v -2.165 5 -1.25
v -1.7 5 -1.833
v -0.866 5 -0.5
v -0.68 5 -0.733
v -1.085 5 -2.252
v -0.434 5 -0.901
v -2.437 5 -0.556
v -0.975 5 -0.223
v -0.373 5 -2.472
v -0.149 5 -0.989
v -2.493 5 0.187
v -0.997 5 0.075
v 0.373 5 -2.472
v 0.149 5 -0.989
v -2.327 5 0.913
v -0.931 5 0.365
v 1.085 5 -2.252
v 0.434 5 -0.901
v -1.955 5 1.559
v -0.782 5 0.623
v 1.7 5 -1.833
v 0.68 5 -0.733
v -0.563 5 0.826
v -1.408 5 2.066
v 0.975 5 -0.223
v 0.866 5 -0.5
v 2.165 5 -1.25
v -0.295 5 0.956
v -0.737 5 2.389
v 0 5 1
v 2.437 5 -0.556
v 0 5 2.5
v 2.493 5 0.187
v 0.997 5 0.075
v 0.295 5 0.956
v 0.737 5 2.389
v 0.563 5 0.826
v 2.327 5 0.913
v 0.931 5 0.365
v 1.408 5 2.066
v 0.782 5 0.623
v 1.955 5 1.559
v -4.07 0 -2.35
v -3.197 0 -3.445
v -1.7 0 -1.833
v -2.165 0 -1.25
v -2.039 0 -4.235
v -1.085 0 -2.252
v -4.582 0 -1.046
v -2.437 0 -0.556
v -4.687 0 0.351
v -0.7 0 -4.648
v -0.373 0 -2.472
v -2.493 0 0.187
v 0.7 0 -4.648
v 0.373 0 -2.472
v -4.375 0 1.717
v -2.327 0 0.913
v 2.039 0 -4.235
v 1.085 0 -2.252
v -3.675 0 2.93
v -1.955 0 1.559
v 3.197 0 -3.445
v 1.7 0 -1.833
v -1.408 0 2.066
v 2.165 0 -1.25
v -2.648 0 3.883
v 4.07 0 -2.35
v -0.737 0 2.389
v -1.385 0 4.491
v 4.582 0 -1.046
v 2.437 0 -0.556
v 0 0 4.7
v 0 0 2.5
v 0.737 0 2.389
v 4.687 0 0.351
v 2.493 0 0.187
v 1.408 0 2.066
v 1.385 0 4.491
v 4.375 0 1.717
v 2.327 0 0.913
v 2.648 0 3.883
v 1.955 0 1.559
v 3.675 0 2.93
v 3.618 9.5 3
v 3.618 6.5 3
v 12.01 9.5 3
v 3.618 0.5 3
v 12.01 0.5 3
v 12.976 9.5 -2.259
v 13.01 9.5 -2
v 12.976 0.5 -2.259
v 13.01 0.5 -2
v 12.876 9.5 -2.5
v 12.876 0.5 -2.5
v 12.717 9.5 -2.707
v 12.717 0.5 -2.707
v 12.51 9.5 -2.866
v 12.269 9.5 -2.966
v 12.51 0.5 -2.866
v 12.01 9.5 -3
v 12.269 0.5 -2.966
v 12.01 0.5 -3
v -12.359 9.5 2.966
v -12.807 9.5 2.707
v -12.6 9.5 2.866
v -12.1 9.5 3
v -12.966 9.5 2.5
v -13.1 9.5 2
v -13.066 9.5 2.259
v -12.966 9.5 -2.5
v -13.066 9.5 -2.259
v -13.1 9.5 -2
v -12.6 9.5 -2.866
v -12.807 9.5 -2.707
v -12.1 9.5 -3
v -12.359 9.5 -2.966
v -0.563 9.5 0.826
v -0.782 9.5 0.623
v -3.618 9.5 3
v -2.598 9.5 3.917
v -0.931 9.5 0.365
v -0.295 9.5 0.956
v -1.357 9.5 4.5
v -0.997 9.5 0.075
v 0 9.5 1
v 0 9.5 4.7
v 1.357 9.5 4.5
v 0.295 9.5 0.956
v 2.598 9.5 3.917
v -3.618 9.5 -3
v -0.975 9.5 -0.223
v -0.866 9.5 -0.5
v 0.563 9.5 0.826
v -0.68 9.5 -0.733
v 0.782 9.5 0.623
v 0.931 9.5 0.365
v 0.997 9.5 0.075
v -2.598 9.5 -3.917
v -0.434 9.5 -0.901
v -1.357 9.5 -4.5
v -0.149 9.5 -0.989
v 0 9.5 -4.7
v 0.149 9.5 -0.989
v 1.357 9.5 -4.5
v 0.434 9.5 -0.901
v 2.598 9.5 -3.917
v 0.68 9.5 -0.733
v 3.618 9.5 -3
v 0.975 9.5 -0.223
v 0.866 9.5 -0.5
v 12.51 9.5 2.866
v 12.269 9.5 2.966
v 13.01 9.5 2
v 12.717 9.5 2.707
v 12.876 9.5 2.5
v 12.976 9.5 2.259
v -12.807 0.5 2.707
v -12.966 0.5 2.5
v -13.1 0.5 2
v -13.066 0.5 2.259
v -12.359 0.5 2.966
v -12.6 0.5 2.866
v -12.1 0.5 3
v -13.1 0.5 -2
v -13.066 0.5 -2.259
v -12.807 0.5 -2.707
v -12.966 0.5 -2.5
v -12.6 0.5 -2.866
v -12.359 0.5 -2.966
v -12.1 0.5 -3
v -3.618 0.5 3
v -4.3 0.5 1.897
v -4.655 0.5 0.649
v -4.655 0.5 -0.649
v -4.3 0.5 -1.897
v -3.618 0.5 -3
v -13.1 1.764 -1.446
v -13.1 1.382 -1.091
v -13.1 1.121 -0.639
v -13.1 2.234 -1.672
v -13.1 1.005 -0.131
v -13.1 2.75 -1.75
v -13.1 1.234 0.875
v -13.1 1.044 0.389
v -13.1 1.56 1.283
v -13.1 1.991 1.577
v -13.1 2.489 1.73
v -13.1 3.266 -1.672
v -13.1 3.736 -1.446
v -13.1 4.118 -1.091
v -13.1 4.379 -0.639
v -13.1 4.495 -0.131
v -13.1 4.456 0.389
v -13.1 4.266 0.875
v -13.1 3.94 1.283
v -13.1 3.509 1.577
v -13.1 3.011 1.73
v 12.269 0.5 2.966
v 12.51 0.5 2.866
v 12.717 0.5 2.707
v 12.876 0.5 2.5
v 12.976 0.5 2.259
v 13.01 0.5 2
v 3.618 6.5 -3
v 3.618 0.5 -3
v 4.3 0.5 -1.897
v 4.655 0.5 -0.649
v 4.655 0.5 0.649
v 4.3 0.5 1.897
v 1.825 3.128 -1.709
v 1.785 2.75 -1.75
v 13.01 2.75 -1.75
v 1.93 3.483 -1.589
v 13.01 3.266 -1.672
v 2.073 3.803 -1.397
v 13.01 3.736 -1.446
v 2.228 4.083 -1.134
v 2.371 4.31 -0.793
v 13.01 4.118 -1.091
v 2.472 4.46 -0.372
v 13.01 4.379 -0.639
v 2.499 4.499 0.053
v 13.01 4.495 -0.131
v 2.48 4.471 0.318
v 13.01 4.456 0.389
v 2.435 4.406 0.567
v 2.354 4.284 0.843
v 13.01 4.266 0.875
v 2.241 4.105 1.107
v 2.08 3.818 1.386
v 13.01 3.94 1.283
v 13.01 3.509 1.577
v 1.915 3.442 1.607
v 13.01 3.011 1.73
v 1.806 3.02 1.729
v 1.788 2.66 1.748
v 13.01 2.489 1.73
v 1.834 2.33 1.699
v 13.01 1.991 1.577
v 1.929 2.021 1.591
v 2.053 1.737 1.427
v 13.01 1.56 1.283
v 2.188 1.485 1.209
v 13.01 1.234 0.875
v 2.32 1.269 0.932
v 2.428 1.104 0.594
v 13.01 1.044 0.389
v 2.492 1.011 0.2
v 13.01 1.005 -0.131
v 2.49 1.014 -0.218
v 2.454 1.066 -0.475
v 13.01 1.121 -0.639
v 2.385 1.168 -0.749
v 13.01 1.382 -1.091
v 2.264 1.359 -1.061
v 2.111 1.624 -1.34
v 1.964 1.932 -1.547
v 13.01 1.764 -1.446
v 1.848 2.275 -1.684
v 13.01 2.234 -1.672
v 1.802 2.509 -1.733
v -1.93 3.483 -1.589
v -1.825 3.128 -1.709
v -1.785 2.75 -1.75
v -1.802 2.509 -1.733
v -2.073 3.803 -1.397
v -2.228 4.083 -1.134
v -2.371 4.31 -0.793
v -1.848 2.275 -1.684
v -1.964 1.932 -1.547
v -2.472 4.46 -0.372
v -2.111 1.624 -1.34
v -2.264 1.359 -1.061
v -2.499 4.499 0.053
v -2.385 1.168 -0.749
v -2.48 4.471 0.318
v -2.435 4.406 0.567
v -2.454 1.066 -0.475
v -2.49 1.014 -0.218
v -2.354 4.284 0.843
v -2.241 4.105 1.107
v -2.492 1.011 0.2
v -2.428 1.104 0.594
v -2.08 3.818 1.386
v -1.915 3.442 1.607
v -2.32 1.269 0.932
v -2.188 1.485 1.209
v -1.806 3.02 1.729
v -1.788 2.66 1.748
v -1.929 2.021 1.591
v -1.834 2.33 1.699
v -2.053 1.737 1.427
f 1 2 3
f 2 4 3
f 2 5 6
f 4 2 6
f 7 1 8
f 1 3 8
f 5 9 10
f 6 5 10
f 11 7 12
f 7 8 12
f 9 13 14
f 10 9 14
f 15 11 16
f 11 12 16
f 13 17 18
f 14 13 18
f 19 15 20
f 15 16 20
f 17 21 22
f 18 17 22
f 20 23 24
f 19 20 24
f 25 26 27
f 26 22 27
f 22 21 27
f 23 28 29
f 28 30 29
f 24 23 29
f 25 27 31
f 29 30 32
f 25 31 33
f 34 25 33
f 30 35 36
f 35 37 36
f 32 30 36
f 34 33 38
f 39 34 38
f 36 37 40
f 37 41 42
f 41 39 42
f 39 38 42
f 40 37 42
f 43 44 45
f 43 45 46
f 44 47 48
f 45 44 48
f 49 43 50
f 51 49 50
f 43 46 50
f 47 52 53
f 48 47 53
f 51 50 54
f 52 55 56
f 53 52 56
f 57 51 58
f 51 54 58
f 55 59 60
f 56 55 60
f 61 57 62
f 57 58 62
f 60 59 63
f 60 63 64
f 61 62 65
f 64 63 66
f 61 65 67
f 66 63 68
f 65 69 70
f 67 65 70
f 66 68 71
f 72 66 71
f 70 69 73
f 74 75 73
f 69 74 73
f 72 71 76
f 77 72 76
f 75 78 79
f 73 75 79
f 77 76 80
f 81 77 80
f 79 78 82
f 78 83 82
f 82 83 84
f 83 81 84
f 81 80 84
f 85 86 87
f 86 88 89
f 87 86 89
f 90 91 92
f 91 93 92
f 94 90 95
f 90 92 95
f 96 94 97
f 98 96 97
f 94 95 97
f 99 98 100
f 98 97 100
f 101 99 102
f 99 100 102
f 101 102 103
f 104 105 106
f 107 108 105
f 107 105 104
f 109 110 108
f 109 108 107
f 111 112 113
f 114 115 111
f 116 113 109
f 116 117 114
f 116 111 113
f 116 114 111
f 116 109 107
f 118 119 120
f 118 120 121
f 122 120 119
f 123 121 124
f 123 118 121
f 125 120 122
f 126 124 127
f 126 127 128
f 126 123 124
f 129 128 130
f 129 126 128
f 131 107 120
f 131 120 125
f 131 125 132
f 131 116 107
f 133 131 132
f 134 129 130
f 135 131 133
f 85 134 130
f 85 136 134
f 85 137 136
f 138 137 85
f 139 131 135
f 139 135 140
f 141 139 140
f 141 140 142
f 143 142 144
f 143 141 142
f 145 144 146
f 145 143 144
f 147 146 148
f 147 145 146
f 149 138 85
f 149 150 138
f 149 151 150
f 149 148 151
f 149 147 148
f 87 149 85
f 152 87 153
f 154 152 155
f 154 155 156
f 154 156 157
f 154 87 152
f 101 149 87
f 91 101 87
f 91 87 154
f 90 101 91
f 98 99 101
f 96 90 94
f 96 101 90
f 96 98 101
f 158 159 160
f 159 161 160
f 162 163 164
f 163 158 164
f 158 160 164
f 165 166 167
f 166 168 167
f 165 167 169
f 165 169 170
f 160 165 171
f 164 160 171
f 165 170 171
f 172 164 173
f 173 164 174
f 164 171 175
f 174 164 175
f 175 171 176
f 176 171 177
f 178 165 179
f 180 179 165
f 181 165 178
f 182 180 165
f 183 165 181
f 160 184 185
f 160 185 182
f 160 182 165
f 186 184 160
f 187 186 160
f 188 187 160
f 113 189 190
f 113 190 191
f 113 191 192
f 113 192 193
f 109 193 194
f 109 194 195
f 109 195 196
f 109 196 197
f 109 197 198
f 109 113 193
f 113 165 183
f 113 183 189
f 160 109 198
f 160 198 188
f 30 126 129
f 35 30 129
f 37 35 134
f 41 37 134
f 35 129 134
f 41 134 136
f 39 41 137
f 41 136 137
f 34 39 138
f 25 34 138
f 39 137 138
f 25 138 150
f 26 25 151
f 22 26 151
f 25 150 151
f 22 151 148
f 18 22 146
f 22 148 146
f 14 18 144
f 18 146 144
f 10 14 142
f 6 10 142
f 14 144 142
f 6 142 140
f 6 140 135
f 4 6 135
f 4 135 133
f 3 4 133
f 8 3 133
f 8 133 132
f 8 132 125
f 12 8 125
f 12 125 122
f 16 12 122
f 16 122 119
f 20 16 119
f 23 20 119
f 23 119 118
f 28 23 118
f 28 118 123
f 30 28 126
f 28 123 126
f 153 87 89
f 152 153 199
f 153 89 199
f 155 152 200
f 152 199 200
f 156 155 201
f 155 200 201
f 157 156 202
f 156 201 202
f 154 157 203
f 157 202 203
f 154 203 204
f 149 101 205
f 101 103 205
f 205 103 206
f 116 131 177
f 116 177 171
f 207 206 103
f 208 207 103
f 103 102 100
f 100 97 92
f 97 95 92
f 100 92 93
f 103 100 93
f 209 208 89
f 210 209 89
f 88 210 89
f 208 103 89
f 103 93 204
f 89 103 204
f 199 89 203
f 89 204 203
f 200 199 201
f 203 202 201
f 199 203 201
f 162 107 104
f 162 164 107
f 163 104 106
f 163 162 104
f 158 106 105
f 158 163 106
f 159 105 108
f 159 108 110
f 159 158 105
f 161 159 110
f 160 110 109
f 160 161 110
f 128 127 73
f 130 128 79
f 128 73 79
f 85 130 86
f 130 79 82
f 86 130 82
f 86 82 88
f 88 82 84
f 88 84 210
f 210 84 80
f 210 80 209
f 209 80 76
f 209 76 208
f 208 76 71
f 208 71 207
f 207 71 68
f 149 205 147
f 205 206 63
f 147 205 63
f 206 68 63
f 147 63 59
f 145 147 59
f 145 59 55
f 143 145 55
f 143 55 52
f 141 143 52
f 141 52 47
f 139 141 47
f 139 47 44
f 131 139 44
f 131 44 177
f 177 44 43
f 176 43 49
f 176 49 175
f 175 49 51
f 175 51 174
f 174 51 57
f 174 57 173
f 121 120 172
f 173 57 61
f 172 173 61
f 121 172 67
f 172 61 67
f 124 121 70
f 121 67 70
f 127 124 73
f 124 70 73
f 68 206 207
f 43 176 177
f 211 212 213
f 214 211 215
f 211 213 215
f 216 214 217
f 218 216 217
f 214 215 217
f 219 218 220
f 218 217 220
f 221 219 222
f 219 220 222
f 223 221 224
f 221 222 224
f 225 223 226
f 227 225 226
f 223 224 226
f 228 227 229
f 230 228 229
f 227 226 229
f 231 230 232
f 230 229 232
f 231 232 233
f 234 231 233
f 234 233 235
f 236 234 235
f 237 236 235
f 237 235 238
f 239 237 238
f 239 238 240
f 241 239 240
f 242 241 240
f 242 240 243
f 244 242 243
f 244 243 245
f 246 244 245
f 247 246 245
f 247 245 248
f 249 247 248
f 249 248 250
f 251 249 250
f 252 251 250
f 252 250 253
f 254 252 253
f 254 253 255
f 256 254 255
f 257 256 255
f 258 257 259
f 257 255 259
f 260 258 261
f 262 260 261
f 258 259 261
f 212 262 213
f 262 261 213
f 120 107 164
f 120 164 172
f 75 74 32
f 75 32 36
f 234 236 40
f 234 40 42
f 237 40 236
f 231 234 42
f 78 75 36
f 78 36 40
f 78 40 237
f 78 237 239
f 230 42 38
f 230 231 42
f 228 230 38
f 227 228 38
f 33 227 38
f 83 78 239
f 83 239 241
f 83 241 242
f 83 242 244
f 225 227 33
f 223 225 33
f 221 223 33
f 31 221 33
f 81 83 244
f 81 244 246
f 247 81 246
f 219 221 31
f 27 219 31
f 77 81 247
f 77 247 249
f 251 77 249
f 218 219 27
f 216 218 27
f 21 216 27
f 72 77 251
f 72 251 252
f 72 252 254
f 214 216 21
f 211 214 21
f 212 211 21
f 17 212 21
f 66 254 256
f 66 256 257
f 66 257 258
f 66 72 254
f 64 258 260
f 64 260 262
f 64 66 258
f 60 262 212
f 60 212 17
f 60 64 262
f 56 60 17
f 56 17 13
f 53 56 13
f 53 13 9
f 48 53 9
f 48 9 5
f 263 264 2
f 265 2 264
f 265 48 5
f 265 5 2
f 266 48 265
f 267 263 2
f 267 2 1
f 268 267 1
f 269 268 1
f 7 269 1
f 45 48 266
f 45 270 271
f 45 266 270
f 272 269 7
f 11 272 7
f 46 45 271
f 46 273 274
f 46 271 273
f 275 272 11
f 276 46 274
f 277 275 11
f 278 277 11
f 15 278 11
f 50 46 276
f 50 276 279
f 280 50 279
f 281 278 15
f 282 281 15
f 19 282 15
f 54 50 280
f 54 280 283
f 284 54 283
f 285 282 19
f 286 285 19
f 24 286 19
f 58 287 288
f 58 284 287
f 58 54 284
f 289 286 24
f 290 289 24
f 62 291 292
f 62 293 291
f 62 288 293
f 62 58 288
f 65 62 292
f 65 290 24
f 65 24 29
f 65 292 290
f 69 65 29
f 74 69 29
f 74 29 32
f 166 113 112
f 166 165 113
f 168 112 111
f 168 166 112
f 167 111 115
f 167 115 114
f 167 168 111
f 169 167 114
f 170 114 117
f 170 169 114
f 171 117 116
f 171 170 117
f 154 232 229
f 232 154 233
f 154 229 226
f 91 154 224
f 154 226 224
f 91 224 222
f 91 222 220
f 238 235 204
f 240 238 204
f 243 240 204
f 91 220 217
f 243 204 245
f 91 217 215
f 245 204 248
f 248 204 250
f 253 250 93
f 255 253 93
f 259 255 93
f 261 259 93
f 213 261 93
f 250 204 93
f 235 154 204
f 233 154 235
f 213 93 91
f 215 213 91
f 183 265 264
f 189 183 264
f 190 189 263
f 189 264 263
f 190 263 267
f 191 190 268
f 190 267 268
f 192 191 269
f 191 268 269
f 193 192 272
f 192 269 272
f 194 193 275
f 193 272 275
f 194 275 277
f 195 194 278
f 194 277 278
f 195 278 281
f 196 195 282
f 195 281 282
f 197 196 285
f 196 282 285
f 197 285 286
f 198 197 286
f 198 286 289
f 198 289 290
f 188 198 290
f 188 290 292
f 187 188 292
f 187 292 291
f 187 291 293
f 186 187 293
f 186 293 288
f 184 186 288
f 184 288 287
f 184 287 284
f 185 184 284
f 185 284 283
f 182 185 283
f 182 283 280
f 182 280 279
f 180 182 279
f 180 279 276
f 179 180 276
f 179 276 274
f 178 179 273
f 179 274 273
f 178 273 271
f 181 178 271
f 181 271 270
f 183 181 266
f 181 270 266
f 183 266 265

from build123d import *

# Parameters (mm, degrees)
SKETCH1_R           = 4.7
SKETCH1_R_2         = 2.5
BOSS_EXTRUDE1_DEPTH = 5
SKETCH2_R           = 4.7
BOSS_EXTRUDE2_DEPTH = 4.5
SKETCH3_R           = 1
CUT_EXTRUDE1_DEPTH  = 4.5
SKETCH6_W           = 6
SKETCH6_H           = 6
BOSS_EXTRUDE3_DEPTH = 8.31
SKETCH7_W           = 6
SKETCH7_H           = 6
BOSS_EXTRUDE4_DEPTH = 2
FILLET1_R           = 1
BOSS_EXTRUDE5_DEPTH = 3
BOSS_EXTRUDE6_DEPTH = 9
FILLET2_R           = 1
SKETCH8_R           = 1.75
CUT_EXTRUDE6_DEPTH  = 37


with BuildPart() as part:
    # Sketch1 → Boss-Extrude1 (new body)
    with BuildSketch(Plane(origin=(0, 0, 0), x_dir=(1, 0, 0), z_dir=(0, 1, 0))):
        with Locations(Location((0, 0, 0), (0, 0, 270))):
            Circle(SKETCH1_R)
        with Locations(Location((0, 0, 0), (0, 0, 270))):
            Circle(SKETCH1_R_2, mode=Mode.SUBTRACT)
    extrude(amount=BOSS_EXTRUDE1_DEPTH)

    # Sketch2 → Boss-Extrude2 (add)
    with BuildSketch(Plane(origin=(0, 5, 0), x_dir=(1, 0, 0), z_dir=(0, 1, 0))):
        with Locations(Location((0, 0, 0), (0, 0, 270))):
            Circle(SKETCH2_R)
    extrude(amount=BOSS_EXTRUDE2_DEPTH)

    # Sketch3 → Cut-Extrude1 (cut)
    with BuildSketch(Plane(origin=(0, 9.5, 0), x_dir=(1, 0, 0), z_dir=(0, 1, 0))):
        with Locations(Location((0, 0, 0), (0, 0, 270))):
            Circle(SKETCH3_R)
    extrude(amount=-CUT_EXTRUDE1_DEPTH, mode=Mode.SUBTRACT)



with BuildPart() as body_2:
    # Sketch6 → Boss-Extrude3 (new body)
    with BuildSketch(Plane(origin=(4.7, 0, 0), x_dir=(0, 0, -1), z_dir=(1, 0, 0))):
        with Locations((0, 3.5)):
            Rectangle(SKETCH6_W, SKETCH6_H)
    extrude(amount=BOSS_EXTRUDE3_DEPTH)


with BuildPart() as part_1:
    add(part.part)

    add(body_2.part)  # Boss-Extrude4 merges body 2
    # Sketch7 → Boss-Extrude4 (add)
    with BuildSketch(Plane.ZY.offset(-4.7)):
        with Locations((0, 3.5)):
            Rectangle(SKETCH7_W, SKETCH7_H)
    extrude(amount=BOSS_EXTRUDE4_DEPTH)

    # Fillet1
    fillet1_edges = [part_1.edges().sort_by_distance(p)[0] for p in [
        (13.01, 3.5, -3),
        (13.01, 3.5, 3),
    ]]
    fillet(fillet1_edges, radius=FILLET1_R)

    # Sketch9 → Boss-Extrude5 (add)
    with BuildSketch(Plane(origin=(0, 6.5, 0), x_dir=(1, 0, 0), z_dir=(0, 1, 0))):
        with BuildLine():
            Line((13.01, -2), (13.01, 2))
            ThreePointArc((13.01, 2), (12.717106781, 2.707106781), (12.01, 3))
            Line((12.01, 3), (3.618010503, 3))
            ThreePointArc((3.618010503, 3), (4.7, 0), (3.618010503, -3))
            Line((3.618010503, -3), (12.01, -3))
            ThreePointArc((12.01, -3), (12.717106781, -2.707106781), (13.01, -2))
        make_face()
    extrude(amount=BOSS_EXTRUDE5_DEPTH)

    # Sketch10 → Boss-Extrude6 (add)
    with BuildSketch(Plane(origin=(0, 9.5, 0), x_dir=(1, 0, 0), z_dir=(0, 1, 0))):
        with BuildLine():
            Line((-13.1, -3), (-3.354101966, -3))
            ThreePointArc((-3.354101966, -3), (-4.5, 0), (-3.354101966, 3))
            Line((-3.354101966, 3), (-13.1, 3))
            Line((-13.1, 3), (-13.1, -3))
        make_face()
    extrude(amount=-BOSS_EXTRUDE6_DEPTH)

    # Fillet2
    fillet2_edges = [part_1.edges().sort_by_distance(p)[0] for p in [
        (-13.1, 5, -3),
        (-13.1, 5, 3),
    ]]
    fillet(fillet2_edges, radius=FILLET2_R)

    # Sketch8 → Cut-Extrude6 (cut)
    with BuildSketch(Plane(origin=(13.01, 0, 0), x_dir=(0, 0, -1), z_dir=(1, 0, 0))):
        with Locations((0, 2.75)):
            Circle(SKETCH8_R)
    extrude(amount=-CUT_EXTRUDE6_DEPTH, mode=Mode.SUBTRACT)


solid = part_1.part
